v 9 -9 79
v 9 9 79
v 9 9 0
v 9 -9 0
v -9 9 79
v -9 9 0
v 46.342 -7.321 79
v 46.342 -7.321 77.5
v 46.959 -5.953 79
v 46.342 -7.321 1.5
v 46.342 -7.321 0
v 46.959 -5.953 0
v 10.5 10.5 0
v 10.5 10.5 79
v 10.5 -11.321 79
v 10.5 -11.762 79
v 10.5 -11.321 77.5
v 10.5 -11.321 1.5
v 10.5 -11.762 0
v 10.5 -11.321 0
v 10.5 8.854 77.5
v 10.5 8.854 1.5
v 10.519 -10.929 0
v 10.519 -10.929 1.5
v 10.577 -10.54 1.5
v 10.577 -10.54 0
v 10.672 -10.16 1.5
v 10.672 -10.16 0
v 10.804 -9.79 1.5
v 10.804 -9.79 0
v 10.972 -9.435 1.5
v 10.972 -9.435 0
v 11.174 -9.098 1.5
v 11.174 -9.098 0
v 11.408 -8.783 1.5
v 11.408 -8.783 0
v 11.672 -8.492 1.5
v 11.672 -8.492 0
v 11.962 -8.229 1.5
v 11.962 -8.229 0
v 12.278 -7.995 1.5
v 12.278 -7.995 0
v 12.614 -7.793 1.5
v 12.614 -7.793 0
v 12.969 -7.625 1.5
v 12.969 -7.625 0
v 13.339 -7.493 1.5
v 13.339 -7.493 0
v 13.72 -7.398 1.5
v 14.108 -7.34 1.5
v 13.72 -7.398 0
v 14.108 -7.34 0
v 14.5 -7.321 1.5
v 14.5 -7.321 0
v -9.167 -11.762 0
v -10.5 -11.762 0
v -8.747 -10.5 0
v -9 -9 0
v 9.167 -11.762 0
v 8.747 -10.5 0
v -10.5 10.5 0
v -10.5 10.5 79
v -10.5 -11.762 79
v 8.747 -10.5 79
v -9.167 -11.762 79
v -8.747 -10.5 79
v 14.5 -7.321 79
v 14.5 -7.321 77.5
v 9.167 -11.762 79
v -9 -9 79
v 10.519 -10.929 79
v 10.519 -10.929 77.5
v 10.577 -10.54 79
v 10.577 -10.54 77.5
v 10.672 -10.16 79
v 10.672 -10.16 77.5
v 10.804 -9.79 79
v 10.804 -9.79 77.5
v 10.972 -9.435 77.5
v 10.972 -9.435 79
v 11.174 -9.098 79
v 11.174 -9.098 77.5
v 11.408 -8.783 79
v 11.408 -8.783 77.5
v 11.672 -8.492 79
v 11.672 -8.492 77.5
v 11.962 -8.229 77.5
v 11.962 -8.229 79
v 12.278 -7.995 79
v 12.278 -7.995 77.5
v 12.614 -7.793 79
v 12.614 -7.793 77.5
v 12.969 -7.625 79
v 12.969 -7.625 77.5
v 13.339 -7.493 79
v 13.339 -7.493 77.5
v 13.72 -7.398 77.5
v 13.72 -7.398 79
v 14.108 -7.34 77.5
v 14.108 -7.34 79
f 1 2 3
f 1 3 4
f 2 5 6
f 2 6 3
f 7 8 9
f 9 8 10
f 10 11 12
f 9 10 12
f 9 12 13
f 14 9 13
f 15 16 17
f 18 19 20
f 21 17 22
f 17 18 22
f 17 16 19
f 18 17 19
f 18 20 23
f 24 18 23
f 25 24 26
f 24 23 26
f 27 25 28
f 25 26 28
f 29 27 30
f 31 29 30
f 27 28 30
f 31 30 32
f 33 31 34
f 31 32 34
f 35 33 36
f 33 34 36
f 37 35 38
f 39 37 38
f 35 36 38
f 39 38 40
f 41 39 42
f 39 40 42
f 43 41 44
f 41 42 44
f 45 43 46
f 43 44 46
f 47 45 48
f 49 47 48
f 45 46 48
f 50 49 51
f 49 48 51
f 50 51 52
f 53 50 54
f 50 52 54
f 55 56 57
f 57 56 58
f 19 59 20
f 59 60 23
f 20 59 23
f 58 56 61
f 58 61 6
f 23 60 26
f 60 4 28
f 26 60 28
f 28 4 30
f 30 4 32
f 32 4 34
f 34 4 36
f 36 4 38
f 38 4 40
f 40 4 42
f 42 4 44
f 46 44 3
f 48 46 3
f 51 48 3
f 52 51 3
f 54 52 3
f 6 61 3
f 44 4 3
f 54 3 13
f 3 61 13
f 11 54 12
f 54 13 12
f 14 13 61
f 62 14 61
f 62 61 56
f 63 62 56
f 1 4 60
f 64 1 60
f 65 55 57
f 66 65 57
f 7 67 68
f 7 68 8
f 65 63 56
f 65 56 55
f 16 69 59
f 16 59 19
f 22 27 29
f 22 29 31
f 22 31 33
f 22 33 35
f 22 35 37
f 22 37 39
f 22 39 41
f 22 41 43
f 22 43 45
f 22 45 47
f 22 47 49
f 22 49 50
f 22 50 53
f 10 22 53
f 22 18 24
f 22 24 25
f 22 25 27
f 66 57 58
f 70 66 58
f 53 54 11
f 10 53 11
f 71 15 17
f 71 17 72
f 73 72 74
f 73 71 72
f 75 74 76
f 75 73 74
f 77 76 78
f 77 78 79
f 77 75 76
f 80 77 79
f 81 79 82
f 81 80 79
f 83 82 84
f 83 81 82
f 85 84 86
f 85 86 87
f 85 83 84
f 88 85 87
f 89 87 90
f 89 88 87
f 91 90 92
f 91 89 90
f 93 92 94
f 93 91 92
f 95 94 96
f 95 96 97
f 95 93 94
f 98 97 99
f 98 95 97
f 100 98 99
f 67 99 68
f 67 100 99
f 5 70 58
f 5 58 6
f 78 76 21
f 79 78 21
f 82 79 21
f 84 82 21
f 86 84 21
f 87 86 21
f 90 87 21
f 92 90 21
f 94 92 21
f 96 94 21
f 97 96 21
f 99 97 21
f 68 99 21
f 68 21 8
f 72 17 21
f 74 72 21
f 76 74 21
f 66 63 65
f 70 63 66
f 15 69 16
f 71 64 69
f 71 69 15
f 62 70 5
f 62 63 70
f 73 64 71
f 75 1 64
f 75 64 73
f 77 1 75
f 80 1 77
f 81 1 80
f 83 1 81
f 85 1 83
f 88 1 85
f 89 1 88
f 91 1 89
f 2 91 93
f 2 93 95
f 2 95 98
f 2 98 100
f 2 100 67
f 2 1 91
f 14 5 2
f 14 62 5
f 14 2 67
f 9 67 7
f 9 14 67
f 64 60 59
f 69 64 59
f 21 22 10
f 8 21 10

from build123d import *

# Parameters (mm, degrees)
F1_DEPTH = 79
F4_DEPTH = 1.5
F5_DEPTH = 1.5


with BuildPart() as f1:
    # F0 (on Top) → F1 (new body)
    with BuildSketch(Plane.XY):
        Polygon((-9, -9), (-9, 9), (9, 9), (9, -9), (8.7474873289, -10.5), (9.1674439609, -11.7616653442), (10.5, -11.7616653442), (10.5, -11.3207034852), (10.5, 8.8543308896), (46.3423287091, -7.3207034852), (46.9593341512, -5.9534784545), (10.5, 10.5), (-10.5, 10.5), (-10.5, -11.7616653442), (-9.1674439609, -11.7616653442), (-8.7474873289, -10.5), align=None)
    extrude(amount=F1_DEPTH)

    # F3 (on offset) → F4 (join)
    with BuildSketch(Plane.XY.offset(79)):
        with BuildLine():
            Line((-9, -9), (-9, 9))
            Line((-9, 9), (9, 9))
            Line((9, 9), (9, -9))
            Line((9, -9), (8.7474873289, -10.5))
            Line((8.7474873289, -10.5), (9.1674439609, -11.7616653442))
            Line((9.1674439609, -11.7616653442), (10.5, -11.7616653442))
            Line((10.5, -11.7616653442), (10.5, -11.3207034852))
            ThreePointArc((10.5, -11.3207034852), (11.6715728753, -8.4922763604), (14.5, -7.3207034852))
            Line((14.5, -7.3207034852), (46.3423287091, -7.3207034852))
            Line((46.3423287091, -7.3207034852), (46.9593341512, -5.9534784545))
            Line((46.9593341512, -5.9534784545), (10.5, 10.5))
            Line((10.5, 10.5), (-10.5, 10.5))
            Line((-10.5, 10.5), (-10.5, -11.7616653442))
            Line((-10.5, -11.7616653442), (-9.1674439609, -11.7616653442))
            Line((-9.1674439609, -11.7616653442), (-8.7474873289, -10.5))
            Line((-8.7474873289, -10.5), (-9, -9))
        make_face()
    extrude(amount=-F4_DEPTH)

    # F0 (on Top) → F5 (join)
    with BuildSketch(Plane.XY):
        with BuildLine():
            Line((10.5, 8.8543308896), (10.5, -11.3207034852))
            ThreePointArc((10.5, -11.3207034852), (11.6715728753, -8.4922763604), (14.5, -7.3207034852))
            Line((14.5, -7.3207034852), (46.3423287091, -7.3207034852))
            Line((46.3423287091, -7.3207034852), (10.5, 8.8543308896))
        make_face()
    extrude(amount=F5_DEPTH)


solid = f1.part
